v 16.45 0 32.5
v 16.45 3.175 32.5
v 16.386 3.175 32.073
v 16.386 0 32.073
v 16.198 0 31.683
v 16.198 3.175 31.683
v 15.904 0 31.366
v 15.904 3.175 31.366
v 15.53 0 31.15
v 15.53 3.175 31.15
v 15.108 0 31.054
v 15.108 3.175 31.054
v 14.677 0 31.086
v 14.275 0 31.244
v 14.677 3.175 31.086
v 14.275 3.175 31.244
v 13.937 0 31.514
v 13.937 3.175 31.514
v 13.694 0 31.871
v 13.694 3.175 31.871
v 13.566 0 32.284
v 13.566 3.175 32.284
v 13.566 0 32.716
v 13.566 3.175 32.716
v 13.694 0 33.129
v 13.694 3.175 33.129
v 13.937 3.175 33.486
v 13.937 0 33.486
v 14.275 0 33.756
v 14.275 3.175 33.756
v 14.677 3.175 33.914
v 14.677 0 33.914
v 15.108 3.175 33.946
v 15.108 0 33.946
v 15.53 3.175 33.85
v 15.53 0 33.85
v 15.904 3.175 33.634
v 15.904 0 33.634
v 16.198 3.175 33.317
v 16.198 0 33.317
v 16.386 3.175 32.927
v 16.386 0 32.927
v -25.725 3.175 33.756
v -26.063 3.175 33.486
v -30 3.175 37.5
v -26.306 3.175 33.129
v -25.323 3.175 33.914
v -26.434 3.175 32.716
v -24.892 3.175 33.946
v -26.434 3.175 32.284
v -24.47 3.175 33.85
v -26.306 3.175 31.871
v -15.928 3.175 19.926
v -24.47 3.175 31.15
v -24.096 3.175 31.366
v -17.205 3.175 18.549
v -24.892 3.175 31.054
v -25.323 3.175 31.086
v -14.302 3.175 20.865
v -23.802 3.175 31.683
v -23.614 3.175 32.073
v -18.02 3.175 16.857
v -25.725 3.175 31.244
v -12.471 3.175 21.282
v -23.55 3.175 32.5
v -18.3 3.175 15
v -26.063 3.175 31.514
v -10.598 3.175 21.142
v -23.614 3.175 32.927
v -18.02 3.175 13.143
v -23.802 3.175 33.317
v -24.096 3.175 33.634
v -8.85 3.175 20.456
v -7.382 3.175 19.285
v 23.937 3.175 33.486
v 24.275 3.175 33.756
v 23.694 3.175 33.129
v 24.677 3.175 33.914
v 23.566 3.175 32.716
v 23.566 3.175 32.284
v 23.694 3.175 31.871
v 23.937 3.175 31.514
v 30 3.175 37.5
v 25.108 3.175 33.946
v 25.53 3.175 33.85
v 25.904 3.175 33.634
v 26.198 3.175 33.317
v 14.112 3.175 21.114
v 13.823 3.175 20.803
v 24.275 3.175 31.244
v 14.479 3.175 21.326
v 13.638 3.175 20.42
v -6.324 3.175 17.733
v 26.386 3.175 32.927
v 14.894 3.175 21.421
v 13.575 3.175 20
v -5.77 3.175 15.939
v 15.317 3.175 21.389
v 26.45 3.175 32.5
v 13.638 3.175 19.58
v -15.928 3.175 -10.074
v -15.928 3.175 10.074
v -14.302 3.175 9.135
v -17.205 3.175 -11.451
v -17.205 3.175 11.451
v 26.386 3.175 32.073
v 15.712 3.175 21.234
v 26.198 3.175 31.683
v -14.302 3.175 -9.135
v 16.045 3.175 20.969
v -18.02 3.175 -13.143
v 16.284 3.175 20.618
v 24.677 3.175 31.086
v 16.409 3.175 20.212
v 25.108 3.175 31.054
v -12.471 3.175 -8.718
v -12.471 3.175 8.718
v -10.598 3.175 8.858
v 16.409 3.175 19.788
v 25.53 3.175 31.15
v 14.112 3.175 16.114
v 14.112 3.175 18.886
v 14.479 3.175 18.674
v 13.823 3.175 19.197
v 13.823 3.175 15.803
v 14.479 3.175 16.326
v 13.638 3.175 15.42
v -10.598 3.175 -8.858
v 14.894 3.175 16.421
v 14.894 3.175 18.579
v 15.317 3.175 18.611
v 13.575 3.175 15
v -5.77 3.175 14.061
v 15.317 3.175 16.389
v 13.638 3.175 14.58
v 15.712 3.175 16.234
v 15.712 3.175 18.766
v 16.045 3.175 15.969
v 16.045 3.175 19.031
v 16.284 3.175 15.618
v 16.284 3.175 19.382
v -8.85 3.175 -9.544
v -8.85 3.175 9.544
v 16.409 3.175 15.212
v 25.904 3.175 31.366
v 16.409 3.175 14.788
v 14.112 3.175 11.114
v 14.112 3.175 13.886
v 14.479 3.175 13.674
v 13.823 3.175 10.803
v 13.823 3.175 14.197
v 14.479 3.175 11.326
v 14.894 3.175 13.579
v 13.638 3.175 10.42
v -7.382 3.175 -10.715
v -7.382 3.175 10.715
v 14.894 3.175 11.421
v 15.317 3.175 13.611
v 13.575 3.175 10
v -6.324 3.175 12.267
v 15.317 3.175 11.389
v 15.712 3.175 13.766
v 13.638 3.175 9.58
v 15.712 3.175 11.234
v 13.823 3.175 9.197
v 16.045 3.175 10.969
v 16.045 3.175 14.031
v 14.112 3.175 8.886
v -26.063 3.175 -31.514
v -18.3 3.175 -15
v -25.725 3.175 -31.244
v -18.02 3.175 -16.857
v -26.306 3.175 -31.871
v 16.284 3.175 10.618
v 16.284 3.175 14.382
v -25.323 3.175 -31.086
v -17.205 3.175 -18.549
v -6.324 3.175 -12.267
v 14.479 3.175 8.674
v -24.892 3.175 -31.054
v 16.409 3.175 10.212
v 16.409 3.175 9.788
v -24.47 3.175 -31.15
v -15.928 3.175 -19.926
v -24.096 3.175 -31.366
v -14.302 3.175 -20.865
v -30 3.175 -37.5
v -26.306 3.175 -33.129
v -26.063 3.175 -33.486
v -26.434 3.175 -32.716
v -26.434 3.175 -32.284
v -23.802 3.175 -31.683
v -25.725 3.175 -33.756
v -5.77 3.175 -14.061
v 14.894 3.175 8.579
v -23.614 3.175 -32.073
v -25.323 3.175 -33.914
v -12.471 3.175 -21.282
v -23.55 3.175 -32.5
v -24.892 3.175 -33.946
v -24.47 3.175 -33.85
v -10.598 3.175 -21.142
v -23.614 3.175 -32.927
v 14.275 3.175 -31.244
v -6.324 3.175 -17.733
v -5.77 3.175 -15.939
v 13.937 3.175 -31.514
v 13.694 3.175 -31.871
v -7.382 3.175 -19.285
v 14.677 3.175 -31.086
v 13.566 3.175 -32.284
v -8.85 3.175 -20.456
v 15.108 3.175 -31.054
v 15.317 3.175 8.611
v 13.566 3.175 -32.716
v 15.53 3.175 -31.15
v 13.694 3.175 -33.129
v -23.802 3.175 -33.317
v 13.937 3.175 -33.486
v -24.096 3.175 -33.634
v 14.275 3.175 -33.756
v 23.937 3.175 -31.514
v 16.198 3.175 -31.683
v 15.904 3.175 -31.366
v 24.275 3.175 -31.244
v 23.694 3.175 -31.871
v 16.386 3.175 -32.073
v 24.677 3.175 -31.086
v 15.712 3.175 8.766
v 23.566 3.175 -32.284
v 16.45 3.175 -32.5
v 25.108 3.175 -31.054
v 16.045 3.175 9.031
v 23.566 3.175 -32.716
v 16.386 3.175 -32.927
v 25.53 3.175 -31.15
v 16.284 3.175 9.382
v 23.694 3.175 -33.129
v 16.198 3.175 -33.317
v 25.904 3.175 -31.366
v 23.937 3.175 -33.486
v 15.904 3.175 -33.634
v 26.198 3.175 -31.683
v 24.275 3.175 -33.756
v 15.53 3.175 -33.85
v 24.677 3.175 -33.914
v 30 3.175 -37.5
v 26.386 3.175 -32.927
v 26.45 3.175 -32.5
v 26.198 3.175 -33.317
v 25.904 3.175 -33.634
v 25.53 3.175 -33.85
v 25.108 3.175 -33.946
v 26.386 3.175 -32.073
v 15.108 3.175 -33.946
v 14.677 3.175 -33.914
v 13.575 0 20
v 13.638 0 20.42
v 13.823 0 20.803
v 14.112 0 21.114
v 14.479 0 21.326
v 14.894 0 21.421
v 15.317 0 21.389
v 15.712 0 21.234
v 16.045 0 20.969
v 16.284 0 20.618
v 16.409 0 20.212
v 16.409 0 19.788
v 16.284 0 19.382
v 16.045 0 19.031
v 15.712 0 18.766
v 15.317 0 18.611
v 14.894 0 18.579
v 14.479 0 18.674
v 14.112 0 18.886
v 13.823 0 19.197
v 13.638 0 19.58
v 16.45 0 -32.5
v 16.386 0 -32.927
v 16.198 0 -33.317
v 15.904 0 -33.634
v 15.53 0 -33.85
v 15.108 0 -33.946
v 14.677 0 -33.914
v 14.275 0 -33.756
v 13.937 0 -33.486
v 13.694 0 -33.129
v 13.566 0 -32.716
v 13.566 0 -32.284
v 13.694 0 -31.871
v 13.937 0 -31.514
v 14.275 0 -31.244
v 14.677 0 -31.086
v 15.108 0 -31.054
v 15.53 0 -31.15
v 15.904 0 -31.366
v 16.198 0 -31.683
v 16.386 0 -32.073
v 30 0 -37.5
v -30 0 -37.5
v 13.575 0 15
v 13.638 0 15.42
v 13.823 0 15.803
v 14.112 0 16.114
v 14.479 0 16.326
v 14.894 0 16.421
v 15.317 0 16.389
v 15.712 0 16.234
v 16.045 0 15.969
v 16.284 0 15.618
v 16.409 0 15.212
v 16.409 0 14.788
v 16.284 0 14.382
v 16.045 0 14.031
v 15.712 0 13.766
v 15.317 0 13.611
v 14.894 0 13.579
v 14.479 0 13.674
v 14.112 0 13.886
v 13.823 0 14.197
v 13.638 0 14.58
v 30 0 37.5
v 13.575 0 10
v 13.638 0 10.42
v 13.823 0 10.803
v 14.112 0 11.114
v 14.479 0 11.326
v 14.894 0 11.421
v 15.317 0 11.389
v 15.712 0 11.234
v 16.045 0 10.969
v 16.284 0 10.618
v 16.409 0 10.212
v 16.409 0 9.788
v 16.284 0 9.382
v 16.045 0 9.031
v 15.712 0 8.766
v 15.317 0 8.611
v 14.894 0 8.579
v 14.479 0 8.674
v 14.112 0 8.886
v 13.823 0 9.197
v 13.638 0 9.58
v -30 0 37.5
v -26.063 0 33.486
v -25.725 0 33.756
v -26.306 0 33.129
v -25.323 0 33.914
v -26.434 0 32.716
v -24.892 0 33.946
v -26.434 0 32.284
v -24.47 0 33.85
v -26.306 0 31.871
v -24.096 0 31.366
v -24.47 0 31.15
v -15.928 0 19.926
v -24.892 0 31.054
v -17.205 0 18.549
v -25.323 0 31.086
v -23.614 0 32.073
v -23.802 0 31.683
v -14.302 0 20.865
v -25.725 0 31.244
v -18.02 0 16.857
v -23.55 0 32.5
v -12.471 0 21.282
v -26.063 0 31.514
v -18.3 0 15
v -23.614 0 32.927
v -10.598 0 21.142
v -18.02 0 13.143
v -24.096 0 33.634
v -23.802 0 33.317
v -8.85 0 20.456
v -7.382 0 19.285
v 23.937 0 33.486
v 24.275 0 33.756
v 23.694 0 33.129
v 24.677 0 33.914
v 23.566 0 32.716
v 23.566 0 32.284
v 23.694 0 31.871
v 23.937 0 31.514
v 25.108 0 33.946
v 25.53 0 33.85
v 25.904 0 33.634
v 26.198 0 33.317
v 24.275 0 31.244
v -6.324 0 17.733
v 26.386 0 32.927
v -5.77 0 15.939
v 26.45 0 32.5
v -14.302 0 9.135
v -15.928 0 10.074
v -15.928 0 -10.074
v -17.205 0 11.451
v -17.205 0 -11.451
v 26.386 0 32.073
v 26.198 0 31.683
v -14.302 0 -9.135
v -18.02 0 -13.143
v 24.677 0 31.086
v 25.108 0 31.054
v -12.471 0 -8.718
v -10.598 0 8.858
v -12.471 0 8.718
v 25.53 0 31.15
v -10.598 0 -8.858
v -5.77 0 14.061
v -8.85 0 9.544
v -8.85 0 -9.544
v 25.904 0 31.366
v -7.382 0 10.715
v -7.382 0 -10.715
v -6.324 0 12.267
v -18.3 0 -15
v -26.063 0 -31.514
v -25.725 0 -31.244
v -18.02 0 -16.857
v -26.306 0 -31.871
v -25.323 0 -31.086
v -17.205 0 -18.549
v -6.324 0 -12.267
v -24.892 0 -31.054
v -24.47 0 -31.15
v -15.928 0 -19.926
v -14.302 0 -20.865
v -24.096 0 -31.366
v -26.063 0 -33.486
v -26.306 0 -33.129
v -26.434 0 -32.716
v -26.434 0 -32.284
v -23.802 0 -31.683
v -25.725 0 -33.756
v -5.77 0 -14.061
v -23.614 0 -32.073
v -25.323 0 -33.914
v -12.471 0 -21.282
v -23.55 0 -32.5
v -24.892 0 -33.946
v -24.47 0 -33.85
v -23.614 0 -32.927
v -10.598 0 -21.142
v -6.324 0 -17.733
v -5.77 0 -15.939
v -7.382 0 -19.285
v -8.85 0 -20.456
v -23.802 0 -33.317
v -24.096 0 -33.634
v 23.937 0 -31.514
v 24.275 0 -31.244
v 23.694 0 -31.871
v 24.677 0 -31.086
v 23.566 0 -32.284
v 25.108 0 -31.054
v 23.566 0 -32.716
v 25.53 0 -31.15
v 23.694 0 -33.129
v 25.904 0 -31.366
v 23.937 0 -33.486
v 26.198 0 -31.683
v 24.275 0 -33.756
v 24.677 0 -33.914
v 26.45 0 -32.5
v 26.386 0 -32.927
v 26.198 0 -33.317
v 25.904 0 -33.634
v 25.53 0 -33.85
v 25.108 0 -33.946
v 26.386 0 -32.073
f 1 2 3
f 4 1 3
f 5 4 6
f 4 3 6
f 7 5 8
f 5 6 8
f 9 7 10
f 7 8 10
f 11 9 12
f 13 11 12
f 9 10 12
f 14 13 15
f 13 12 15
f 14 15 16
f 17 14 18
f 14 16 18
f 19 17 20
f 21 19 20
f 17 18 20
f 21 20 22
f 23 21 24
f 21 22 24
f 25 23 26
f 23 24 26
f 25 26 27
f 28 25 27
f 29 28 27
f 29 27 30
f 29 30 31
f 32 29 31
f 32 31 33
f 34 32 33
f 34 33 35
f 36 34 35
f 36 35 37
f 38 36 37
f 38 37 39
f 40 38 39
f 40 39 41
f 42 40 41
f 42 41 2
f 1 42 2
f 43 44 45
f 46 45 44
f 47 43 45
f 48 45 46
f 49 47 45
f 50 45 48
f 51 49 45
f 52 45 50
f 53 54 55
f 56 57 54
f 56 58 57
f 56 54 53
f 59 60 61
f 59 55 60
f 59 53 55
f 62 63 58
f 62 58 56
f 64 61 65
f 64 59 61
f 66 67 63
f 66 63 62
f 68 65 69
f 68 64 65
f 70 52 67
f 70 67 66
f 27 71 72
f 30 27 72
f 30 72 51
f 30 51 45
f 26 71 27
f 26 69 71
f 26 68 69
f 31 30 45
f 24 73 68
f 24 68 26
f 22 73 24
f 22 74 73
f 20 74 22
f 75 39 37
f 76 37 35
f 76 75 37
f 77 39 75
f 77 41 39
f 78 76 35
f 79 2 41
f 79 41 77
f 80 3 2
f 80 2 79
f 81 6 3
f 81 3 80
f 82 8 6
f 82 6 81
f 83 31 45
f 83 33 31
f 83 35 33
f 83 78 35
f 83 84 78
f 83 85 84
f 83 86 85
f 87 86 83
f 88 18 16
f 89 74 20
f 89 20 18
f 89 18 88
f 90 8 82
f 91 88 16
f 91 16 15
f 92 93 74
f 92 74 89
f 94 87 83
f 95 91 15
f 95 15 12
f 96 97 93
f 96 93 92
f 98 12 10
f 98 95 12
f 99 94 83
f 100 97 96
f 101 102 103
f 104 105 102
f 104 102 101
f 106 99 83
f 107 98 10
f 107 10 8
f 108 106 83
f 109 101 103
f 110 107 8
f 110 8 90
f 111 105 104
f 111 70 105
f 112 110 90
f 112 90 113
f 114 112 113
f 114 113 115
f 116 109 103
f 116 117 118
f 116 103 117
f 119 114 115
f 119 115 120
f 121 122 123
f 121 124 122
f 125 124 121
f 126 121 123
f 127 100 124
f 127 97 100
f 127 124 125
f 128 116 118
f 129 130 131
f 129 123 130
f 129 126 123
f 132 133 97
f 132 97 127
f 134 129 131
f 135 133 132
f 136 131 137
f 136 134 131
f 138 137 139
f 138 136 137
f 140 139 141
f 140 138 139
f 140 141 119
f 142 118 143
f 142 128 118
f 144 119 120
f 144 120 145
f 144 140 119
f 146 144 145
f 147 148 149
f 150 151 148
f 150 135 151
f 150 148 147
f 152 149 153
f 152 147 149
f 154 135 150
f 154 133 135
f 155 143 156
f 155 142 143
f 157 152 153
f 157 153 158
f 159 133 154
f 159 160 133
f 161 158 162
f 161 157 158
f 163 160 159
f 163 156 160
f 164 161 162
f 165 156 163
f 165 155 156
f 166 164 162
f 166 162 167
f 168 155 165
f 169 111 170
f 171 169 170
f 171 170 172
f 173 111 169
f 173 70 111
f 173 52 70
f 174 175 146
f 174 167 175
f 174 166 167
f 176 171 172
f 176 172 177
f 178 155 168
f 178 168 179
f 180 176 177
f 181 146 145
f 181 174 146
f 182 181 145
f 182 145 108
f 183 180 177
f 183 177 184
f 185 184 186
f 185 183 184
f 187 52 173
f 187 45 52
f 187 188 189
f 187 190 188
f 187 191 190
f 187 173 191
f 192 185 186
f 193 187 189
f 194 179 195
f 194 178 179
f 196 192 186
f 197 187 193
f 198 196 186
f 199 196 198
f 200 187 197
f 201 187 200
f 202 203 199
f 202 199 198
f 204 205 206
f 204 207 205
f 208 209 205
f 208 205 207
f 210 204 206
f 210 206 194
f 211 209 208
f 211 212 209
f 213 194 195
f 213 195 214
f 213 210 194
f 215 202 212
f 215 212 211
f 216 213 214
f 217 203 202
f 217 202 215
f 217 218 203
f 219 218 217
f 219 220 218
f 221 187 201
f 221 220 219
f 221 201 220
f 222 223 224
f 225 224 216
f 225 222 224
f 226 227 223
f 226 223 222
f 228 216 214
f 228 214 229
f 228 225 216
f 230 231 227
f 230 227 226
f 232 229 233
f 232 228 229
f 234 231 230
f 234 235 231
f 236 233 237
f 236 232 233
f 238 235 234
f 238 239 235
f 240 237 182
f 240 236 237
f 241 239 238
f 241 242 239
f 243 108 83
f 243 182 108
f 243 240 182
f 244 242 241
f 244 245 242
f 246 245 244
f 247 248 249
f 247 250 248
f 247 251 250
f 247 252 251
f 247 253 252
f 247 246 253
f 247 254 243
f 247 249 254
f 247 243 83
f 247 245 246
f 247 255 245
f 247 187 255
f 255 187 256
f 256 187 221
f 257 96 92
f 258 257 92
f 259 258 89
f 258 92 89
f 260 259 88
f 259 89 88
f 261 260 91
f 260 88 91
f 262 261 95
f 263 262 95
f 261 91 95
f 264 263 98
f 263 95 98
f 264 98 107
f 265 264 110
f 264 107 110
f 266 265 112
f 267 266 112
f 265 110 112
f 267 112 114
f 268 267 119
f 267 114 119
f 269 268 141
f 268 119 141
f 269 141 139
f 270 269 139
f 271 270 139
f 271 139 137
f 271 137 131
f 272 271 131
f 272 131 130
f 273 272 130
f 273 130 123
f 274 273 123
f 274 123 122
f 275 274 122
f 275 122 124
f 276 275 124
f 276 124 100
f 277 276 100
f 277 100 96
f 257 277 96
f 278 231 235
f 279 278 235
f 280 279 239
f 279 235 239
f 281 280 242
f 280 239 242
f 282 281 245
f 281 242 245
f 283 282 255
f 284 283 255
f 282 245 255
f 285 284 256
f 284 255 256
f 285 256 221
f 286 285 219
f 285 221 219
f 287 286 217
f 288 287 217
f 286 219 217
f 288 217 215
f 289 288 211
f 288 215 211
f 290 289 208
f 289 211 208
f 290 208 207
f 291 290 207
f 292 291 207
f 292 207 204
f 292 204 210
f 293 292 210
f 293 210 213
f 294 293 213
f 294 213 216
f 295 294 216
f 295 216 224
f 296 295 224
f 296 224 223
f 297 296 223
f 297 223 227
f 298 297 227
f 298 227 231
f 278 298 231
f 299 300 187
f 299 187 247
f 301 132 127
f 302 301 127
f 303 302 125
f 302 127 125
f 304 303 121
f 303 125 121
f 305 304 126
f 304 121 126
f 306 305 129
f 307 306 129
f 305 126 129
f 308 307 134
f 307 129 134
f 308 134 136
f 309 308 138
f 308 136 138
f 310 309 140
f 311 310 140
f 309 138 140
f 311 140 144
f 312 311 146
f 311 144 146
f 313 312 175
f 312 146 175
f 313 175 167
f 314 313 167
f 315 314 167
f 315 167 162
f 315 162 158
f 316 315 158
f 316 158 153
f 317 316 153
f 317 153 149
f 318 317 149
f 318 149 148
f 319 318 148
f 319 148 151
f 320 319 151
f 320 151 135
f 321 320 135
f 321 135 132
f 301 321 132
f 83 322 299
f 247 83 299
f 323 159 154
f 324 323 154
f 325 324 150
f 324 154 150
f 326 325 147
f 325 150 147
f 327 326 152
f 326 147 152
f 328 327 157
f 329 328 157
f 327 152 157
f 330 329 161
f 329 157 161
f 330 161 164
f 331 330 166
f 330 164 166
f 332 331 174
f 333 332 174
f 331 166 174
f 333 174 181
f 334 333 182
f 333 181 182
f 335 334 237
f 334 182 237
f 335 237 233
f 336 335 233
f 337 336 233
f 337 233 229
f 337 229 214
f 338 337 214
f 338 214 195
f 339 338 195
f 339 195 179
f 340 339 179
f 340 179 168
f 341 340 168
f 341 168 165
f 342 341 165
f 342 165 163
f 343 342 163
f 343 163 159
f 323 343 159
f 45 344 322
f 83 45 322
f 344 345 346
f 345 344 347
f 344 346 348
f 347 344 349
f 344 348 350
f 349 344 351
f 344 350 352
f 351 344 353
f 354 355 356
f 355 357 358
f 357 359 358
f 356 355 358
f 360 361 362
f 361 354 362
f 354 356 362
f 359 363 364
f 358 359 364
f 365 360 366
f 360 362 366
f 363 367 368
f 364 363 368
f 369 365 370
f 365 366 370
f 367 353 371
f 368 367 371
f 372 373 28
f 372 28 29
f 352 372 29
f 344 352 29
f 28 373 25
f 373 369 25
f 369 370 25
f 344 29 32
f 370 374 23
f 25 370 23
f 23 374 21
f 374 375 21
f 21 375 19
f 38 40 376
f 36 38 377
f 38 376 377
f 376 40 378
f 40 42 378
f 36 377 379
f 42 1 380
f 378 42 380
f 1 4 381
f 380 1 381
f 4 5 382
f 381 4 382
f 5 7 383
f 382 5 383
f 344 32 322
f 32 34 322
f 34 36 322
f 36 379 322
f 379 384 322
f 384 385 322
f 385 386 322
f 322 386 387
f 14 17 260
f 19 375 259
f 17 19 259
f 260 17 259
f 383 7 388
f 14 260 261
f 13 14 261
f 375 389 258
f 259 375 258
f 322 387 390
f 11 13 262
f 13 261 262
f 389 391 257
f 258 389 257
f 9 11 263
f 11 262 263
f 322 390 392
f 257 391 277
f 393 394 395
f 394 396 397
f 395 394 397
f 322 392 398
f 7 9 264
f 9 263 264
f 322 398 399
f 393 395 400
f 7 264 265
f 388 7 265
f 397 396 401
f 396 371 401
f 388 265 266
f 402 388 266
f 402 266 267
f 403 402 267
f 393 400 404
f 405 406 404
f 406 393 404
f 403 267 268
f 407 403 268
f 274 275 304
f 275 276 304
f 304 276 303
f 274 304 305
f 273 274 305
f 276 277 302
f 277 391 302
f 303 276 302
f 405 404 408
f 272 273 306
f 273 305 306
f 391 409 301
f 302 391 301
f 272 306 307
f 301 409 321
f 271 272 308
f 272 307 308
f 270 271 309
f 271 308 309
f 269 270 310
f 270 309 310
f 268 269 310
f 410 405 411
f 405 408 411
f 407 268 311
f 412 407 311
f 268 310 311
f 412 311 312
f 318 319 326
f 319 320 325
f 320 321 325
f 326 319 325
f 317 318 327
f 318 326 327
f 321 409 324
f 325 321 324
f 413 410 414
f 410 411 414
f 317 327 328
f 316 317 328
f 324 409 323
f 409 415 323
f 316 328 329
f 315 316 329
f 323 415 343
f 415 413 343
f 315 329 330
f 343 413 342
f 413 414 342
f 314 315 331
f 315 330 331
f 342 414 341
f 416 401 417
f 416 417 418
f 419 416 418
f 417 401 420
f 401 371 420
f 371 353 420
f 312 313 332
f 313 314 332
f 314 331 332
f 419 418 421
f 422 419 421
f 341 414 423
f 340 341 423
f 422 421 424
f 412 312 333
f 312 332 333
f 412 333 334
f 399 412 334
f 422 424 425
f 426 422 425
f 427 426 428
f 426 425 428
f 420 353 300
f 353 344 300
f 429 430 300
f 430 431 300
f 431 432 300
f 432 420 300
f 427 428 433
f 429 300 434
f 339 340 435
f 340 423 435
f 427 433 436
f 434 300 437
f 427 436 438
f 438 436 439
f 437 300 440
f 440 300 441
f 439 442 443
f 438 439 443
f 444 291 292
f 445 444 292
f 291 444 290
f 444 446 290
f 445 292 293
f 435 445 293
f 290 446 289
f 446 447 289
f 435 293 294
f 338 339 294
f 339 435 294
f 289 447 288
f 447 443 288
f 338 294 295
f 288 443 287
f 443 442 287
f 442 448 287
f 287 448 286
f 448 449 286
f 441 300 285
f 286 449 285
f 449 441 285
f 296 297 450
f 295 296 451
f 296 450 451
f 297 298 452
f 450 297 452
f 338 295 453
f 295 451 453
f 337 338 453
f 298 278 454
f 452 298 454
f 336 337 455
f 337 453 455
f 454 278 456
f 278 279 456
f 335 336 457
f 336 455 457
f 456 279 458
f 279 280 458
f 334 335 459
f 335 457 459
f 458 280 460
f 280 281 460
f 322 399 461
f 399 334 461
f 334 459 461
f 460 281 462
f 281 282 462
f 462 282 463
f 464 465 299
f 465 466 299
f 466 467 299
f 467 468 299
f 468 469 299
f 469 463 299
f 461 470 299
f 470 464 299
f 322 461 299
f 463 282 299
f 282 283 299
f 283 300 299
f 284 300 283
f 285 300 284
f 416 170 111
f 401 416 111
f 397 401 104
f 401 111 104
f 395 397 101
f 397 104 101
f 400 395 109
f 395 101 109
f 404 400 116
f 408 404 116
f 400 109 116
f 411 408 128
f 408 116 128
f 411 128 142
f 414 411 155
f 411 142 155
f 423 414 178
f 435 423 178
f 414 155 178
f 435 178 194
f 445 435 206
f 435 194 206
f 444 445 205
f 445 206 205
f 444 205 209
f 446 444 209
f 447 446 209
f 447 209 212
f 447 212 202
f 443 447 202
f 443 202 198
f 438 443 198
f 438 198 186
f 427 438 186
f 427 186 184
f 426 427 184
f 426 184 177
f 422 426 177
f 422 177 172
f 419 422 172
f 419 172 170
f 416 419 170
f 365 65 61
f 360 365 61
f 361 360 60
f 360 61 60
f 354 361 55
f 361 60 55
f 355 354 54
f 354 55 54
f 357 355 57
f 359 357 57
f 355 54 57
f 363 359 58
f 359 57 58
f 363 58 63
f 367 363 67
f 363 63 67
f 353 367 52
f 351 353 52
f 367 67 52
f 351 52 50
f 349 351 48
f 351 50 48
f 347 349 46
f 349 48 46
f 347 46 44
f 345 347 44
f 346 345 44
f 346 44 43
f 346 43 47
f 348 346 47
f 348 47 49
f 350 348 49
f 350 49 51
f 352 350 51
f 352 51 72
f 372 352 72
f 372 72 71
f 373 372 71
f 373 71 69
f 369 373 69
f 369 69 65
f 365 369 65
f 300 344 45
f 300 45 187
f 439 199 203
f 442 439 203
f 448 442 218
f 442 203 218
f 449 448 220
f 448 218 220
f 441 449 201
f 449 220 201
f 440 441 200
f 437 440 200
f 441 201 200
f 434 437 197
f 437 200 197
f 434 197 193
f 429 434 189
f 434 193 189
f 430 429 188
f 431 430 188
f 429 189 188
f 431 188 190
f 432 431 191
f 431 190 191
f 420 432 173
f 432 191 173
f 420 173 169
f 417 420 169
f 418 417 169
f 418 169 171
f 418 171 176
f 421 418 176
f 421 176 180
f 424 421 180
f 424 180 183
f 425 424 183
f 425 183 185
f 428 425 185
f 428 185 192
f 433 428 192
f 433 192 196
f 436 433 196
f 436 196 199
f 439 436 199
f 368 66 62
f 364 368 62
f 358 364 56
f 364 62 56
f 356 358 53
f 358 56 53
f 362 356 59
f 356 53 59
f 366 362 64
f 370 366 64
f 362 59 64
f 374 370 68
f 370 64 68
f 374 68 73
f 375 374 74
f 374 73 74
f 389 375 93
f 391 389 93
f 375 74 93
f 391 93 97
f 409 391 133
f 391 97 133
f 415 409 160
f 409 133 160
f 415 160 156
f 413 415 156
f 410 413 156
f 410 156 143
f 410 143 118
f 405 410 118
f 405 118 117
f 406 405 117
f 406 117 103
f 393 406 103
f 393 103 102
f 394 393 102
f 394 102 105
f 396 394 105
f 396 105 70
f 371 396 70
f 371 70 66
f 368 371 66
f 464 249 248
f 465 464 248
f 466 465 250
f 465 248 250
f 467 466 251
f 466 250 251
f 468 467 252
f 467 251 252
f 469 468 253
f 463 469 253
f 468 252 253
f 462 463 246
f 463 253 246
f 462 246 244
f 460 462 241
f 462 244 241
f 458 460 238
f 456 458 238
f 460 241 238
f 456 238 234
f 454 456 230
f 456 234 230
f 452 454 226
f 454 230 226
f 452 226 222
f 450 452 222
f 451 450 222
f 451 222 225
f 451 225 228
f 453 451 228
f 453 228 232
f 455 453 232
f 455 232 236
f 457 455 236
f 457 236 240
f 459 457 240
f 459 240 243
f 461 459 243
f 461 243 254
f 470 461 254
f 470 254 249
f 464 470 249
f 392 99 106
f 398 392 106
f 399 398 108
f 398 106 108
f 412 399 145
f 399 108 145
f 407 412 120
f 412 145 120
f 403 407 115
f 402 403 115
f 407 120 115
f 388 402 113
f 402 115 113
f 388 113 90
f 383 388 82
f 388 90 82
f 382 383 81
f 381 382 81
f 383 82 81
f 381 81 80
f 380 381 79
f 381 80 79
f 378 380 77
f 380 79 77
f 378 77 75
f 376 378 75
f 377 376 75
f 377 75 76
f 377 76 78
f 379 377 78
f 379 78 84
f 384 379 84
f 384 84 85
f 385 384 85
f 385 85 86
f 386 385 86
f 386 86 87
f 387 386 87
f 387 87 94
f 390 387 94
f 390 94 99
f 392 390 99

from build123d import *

# Parameters (mm, degrees)
SKETCH1_W           = 60
SKETCH1_H           = 75
BOSS_EXTRUDE1_DEPTH = 3.175
SKETCH2_R           = 1.45
CUT_EXTRUDE1_DEPTH  = 4.175
SKETCH3_R           = 6.3
SKETCH3_R_2         = 1.425
CUT_EXTRUDE2_DEPTH  = 4.175


with BuildPart() as part:
    # Sketch1 → Boss-Extrude1 (new body)
    with BuildSketch(Plane(origin=(0, 0, 0), x_dir=(1, 0, 0), z_dir=(0, 1, 0))):
        Rectangle(SKETCH1_W, SKETCH1_H)
    extrude(amount=BOSS_EXTRUDE1_DEPTH)

    # Sketch2 → Cut-Extrude1 (cut, through all)
    with BuildSketch(Plane(origin=(0, 3.175, 0), x_dir=(1, 0, 0), z_dir=(0, 1, 0))):
        with Locations((25, 32.5)):
            Circle(SKETCH2_R)
        with Locations((-25, 32.5)):
            Circle(SKETCH2_R)
        with Locations((15, 32.5)):
            Circle(SKETCH2_R)
        with Locations((25, -32.5)):
            Circle(SKETCH2_R)
        with Locations((15, -32.5)):
            Circle(SKETCH2_R)
        with Locations((-25, -32.5)):
            Circle(SKETCH2_R)
    extrude(amount=-CUT_EXTRUDE1_DEPTH, mode=Mode.SUBTRACT)

    # Sketch3 → Cut-Extrude2 (cut, through all)
    with BuildSketch(Plane(origin=(0, 3.175, 0), x_dir=(-1, 0, 0), z_dir=(0, 1, 0))):
        with Locations((12, -15)):
            Circle(SKETCH3_R)
        with Locations((12, 15)):
            Circle(SKETCH3_R)
        with Locations((-15, 20)):
            Circle(SKETCH3_R_2)
        with Locations((-15, 15)):
            Circle(SKETCH3_R_2)
        with Locations((-15, 10)):
            Circle(SKETCH3_R_2)
    extrude(amount=-CUT_EXTRUDE2_DEPTH, mode=Mode.SUBTRACT)


solid = part.part
